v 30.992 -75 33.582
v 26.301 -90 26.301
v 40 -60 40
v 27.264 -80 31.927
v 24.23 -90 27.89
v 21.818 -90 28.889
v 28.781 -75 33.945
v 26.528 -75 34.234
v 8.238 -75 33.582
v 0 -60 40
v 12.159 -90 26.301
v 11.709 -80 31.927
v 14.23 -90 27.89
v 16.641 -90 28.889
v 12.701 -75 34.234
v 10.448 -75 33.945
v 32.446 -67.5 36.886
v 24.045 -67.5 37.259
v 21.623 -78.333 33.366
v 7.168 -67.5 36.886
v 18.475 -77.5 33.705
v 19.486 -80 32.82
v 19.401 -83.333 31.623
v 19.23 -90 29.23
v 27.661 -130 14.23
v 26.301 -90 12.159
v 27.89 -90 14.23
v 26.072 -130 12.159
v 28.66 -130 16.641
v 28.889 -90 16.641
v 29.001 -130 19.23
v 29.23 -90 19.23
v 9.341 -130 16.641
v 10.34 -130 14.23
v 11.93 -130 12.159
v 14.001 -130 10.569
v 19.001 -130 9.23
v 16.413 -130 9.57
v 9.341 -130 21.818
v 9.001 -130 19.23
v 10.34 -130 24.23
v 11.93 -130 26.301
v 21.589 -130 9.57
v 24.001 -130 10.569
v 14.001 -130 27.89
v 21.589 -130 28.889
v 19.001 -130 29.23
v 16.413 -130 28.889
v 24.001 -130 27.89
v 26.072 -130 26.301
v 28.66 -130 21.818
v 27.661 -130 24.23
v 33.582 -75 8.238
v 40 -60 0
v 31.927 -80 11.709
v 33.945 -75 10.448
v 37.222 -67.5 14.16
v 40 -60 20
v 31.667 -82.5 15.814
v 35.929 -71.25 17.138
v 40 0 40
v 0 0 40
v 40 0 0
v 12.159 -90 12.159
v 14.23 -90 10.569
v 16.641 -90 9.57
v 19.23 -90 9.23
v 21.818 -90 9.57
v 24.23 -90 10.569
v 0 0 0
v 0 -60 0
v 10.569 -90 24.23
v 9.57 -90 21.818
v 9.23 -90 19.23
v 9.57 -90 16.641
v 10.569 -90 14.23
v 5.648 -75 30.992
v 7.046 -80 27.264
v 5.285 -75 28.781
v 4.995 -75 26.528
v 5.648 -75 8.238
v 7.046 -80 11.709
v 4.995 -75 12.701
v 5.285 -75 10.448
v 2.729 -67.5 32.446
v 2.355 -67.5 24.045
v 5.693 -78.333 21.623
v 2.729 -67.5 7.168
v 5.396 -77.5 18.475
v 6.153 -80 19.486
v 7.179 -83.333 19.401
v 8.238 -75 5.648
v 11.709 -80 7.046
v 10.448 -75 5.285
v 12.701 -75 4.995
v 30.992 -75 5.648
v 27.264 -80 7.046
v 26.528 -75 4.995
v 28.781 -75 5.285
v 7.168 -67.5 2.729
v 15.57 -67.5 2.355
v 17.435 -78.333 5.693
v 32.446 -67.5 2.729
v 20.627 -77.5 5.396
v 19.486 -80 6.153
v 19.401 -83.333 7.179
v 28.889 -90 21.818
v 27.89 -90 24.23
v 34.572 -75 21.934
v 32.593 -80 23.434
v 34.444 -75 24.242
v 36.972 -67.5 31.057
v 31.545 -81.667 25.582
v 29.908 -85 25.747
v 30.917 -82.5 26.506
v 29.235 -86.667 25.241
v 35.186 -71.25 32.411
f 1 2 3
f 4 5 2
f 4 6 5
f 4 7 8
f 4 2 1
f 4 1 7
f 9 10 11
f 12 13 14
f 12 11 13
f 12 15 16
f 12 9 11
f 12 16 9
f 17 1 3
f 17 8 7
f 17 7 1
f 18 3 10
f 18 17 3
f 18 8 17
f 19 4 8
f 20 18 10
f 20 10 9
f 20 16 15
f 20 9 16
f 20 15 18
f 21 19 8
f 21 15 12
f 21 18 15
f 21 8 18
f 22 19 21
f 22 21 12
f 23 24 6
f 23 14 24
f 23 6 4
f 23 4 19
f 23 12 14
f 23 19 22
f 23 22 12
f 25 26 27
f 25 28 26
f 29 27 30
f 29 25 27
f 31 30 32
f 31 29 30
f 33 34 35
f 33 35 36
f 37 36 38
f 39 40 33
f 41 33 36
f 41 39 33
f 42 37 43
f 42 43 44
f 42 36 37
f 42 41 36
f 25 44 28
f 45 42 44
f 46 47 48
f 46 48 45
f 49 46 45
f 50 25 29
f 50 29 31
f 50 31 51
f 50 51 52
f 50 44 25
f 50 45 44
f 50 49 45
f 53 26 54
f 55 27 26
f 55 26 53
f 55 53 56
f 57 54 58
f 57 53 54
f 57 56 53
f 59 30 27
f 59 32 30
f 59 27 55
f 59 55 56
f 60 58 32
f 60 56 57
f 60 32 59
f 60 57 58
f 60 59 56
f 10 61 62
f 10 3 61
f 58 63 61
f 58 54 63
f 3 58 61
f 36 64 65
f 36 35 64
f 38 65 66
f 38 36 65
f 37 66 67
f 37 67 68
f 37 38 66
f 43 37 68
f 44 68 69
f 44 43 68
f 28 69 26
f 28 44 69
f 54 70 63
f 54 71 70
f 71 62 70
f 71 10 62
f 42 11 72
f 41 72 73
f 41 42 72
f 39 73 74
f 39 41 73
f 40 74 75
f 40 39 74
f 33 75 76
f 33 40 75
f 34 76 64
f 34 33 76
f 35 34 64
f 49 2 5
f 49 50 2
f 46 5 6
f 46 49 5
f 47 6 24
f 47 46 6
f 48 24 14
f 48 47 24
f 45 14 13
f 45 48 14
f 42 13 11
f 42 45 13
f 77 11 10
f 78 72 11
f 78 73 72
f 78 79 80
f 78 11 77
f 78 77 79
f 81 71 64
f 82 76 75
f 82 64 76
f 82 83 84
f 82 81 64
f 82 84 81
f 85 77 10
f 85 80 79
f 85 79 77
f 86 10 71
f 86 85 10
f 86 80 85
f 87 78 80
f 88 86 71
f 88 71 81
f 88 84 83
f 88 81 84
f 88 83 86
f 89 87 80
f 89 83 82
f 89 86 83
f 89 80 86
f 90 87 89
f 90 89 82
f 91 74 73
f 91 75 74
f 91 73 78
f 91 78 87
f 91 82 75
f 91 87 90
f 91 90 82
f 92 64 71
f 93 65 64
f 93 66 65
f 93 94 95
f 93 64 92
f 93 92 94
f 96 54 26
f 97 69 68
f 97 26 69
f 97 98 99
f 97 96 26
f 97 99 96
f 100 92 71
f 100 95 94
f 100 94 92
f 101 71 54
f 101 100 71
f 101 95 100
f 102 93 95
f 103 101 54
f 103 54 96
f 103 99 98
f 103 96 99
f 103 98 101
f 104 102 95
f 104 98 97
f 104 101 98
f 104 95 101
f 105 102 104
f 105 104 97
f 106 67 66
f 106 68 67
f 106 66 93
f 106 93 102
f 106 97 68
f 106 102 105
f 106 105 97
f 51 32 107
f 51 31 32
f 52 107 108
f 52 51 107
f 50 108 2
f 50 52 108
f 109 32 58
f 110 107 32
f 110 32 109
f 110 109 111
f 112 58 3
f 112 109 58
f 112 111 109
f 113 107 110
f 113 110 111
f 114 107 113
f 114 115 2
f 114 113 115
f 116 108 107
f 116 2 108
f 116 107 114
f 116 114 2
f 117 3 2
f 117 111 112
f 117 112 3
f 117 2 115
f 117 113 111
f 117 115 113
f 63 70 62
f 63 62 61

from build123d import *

# Parameters (mm, degrees)
F0_W      = 40
F0_H      = 40
F2_W      = 40
F2_H      = 40
F7_FACE_W = 40
F7_FACE_H = 40
F4_R      = 10
F6_R      = 10


with BuildPart() as f7:
    # F0 (on Front) → F7 section 0
    with BuildSketch(Plane.XZ):
        with Locations((20, 20)):
            Rectangle(F0_W, F0_H)
    # F2 (on offset) → F7 section 1
    with BuildSketch(Plane.XZ.offset(60)):
        with Locations((20, 20)):
            Rectangle(F2_W, F2_H)
    loft()

    # F7_face (on face) → F8 section 0
    with BuildSketch(Plane(origin=(20, -60, 20), x_dir=(1, 0, 0), z_dir=(0, -1, 0))):
        Rectangle(F7_FACE_W, F7_FACE_H)
    # F4 (on offset) → F8 section 1
    with BuildSketch(Plane.XZ.offset(90)):
        with Locations((19.2296523601, 19.2296523601)):
            Circle(F4_R)
    loft()

    # F8_face (on face) → F9 section 0
    with BuildSketch(Plane(origin=(19.2296523601, -90, 19.2296523601), x_dir=(1, 0, 0), z_dir=(0, -1, 0))):
        with BuildLine():
            ThreePointArc((-7.0710678119, 7.0710678119), (-10, 0), (-7.0710678119, -7.0710678119))
            ThreePointArc((-7.0710678119, -7.0710678119), (0, -10), (7.0710678119, -7.0710678119))
            ThreePointArc((7.0710678119, -7.0710678119), (9.2387953251, -3.8268343237), (10, 0))
            ThreePointArc((10, 0), (9.2387953251, 3.8268343237), (7.0710678119, 7.0710678119))
            ThreePointArc((7.0710678119, 7.0710678119), (0, 10), (-7.0710678119, 7.0710678119))
        make_face()
    # F6 (on offset) → F9 section 1
    with BuildSketch(Plane.XZ.offset(130)):
        with Locations((19.000729546, 19.2296523601)):
            Circle(F6_R)
    loft()


solid = f7.part
